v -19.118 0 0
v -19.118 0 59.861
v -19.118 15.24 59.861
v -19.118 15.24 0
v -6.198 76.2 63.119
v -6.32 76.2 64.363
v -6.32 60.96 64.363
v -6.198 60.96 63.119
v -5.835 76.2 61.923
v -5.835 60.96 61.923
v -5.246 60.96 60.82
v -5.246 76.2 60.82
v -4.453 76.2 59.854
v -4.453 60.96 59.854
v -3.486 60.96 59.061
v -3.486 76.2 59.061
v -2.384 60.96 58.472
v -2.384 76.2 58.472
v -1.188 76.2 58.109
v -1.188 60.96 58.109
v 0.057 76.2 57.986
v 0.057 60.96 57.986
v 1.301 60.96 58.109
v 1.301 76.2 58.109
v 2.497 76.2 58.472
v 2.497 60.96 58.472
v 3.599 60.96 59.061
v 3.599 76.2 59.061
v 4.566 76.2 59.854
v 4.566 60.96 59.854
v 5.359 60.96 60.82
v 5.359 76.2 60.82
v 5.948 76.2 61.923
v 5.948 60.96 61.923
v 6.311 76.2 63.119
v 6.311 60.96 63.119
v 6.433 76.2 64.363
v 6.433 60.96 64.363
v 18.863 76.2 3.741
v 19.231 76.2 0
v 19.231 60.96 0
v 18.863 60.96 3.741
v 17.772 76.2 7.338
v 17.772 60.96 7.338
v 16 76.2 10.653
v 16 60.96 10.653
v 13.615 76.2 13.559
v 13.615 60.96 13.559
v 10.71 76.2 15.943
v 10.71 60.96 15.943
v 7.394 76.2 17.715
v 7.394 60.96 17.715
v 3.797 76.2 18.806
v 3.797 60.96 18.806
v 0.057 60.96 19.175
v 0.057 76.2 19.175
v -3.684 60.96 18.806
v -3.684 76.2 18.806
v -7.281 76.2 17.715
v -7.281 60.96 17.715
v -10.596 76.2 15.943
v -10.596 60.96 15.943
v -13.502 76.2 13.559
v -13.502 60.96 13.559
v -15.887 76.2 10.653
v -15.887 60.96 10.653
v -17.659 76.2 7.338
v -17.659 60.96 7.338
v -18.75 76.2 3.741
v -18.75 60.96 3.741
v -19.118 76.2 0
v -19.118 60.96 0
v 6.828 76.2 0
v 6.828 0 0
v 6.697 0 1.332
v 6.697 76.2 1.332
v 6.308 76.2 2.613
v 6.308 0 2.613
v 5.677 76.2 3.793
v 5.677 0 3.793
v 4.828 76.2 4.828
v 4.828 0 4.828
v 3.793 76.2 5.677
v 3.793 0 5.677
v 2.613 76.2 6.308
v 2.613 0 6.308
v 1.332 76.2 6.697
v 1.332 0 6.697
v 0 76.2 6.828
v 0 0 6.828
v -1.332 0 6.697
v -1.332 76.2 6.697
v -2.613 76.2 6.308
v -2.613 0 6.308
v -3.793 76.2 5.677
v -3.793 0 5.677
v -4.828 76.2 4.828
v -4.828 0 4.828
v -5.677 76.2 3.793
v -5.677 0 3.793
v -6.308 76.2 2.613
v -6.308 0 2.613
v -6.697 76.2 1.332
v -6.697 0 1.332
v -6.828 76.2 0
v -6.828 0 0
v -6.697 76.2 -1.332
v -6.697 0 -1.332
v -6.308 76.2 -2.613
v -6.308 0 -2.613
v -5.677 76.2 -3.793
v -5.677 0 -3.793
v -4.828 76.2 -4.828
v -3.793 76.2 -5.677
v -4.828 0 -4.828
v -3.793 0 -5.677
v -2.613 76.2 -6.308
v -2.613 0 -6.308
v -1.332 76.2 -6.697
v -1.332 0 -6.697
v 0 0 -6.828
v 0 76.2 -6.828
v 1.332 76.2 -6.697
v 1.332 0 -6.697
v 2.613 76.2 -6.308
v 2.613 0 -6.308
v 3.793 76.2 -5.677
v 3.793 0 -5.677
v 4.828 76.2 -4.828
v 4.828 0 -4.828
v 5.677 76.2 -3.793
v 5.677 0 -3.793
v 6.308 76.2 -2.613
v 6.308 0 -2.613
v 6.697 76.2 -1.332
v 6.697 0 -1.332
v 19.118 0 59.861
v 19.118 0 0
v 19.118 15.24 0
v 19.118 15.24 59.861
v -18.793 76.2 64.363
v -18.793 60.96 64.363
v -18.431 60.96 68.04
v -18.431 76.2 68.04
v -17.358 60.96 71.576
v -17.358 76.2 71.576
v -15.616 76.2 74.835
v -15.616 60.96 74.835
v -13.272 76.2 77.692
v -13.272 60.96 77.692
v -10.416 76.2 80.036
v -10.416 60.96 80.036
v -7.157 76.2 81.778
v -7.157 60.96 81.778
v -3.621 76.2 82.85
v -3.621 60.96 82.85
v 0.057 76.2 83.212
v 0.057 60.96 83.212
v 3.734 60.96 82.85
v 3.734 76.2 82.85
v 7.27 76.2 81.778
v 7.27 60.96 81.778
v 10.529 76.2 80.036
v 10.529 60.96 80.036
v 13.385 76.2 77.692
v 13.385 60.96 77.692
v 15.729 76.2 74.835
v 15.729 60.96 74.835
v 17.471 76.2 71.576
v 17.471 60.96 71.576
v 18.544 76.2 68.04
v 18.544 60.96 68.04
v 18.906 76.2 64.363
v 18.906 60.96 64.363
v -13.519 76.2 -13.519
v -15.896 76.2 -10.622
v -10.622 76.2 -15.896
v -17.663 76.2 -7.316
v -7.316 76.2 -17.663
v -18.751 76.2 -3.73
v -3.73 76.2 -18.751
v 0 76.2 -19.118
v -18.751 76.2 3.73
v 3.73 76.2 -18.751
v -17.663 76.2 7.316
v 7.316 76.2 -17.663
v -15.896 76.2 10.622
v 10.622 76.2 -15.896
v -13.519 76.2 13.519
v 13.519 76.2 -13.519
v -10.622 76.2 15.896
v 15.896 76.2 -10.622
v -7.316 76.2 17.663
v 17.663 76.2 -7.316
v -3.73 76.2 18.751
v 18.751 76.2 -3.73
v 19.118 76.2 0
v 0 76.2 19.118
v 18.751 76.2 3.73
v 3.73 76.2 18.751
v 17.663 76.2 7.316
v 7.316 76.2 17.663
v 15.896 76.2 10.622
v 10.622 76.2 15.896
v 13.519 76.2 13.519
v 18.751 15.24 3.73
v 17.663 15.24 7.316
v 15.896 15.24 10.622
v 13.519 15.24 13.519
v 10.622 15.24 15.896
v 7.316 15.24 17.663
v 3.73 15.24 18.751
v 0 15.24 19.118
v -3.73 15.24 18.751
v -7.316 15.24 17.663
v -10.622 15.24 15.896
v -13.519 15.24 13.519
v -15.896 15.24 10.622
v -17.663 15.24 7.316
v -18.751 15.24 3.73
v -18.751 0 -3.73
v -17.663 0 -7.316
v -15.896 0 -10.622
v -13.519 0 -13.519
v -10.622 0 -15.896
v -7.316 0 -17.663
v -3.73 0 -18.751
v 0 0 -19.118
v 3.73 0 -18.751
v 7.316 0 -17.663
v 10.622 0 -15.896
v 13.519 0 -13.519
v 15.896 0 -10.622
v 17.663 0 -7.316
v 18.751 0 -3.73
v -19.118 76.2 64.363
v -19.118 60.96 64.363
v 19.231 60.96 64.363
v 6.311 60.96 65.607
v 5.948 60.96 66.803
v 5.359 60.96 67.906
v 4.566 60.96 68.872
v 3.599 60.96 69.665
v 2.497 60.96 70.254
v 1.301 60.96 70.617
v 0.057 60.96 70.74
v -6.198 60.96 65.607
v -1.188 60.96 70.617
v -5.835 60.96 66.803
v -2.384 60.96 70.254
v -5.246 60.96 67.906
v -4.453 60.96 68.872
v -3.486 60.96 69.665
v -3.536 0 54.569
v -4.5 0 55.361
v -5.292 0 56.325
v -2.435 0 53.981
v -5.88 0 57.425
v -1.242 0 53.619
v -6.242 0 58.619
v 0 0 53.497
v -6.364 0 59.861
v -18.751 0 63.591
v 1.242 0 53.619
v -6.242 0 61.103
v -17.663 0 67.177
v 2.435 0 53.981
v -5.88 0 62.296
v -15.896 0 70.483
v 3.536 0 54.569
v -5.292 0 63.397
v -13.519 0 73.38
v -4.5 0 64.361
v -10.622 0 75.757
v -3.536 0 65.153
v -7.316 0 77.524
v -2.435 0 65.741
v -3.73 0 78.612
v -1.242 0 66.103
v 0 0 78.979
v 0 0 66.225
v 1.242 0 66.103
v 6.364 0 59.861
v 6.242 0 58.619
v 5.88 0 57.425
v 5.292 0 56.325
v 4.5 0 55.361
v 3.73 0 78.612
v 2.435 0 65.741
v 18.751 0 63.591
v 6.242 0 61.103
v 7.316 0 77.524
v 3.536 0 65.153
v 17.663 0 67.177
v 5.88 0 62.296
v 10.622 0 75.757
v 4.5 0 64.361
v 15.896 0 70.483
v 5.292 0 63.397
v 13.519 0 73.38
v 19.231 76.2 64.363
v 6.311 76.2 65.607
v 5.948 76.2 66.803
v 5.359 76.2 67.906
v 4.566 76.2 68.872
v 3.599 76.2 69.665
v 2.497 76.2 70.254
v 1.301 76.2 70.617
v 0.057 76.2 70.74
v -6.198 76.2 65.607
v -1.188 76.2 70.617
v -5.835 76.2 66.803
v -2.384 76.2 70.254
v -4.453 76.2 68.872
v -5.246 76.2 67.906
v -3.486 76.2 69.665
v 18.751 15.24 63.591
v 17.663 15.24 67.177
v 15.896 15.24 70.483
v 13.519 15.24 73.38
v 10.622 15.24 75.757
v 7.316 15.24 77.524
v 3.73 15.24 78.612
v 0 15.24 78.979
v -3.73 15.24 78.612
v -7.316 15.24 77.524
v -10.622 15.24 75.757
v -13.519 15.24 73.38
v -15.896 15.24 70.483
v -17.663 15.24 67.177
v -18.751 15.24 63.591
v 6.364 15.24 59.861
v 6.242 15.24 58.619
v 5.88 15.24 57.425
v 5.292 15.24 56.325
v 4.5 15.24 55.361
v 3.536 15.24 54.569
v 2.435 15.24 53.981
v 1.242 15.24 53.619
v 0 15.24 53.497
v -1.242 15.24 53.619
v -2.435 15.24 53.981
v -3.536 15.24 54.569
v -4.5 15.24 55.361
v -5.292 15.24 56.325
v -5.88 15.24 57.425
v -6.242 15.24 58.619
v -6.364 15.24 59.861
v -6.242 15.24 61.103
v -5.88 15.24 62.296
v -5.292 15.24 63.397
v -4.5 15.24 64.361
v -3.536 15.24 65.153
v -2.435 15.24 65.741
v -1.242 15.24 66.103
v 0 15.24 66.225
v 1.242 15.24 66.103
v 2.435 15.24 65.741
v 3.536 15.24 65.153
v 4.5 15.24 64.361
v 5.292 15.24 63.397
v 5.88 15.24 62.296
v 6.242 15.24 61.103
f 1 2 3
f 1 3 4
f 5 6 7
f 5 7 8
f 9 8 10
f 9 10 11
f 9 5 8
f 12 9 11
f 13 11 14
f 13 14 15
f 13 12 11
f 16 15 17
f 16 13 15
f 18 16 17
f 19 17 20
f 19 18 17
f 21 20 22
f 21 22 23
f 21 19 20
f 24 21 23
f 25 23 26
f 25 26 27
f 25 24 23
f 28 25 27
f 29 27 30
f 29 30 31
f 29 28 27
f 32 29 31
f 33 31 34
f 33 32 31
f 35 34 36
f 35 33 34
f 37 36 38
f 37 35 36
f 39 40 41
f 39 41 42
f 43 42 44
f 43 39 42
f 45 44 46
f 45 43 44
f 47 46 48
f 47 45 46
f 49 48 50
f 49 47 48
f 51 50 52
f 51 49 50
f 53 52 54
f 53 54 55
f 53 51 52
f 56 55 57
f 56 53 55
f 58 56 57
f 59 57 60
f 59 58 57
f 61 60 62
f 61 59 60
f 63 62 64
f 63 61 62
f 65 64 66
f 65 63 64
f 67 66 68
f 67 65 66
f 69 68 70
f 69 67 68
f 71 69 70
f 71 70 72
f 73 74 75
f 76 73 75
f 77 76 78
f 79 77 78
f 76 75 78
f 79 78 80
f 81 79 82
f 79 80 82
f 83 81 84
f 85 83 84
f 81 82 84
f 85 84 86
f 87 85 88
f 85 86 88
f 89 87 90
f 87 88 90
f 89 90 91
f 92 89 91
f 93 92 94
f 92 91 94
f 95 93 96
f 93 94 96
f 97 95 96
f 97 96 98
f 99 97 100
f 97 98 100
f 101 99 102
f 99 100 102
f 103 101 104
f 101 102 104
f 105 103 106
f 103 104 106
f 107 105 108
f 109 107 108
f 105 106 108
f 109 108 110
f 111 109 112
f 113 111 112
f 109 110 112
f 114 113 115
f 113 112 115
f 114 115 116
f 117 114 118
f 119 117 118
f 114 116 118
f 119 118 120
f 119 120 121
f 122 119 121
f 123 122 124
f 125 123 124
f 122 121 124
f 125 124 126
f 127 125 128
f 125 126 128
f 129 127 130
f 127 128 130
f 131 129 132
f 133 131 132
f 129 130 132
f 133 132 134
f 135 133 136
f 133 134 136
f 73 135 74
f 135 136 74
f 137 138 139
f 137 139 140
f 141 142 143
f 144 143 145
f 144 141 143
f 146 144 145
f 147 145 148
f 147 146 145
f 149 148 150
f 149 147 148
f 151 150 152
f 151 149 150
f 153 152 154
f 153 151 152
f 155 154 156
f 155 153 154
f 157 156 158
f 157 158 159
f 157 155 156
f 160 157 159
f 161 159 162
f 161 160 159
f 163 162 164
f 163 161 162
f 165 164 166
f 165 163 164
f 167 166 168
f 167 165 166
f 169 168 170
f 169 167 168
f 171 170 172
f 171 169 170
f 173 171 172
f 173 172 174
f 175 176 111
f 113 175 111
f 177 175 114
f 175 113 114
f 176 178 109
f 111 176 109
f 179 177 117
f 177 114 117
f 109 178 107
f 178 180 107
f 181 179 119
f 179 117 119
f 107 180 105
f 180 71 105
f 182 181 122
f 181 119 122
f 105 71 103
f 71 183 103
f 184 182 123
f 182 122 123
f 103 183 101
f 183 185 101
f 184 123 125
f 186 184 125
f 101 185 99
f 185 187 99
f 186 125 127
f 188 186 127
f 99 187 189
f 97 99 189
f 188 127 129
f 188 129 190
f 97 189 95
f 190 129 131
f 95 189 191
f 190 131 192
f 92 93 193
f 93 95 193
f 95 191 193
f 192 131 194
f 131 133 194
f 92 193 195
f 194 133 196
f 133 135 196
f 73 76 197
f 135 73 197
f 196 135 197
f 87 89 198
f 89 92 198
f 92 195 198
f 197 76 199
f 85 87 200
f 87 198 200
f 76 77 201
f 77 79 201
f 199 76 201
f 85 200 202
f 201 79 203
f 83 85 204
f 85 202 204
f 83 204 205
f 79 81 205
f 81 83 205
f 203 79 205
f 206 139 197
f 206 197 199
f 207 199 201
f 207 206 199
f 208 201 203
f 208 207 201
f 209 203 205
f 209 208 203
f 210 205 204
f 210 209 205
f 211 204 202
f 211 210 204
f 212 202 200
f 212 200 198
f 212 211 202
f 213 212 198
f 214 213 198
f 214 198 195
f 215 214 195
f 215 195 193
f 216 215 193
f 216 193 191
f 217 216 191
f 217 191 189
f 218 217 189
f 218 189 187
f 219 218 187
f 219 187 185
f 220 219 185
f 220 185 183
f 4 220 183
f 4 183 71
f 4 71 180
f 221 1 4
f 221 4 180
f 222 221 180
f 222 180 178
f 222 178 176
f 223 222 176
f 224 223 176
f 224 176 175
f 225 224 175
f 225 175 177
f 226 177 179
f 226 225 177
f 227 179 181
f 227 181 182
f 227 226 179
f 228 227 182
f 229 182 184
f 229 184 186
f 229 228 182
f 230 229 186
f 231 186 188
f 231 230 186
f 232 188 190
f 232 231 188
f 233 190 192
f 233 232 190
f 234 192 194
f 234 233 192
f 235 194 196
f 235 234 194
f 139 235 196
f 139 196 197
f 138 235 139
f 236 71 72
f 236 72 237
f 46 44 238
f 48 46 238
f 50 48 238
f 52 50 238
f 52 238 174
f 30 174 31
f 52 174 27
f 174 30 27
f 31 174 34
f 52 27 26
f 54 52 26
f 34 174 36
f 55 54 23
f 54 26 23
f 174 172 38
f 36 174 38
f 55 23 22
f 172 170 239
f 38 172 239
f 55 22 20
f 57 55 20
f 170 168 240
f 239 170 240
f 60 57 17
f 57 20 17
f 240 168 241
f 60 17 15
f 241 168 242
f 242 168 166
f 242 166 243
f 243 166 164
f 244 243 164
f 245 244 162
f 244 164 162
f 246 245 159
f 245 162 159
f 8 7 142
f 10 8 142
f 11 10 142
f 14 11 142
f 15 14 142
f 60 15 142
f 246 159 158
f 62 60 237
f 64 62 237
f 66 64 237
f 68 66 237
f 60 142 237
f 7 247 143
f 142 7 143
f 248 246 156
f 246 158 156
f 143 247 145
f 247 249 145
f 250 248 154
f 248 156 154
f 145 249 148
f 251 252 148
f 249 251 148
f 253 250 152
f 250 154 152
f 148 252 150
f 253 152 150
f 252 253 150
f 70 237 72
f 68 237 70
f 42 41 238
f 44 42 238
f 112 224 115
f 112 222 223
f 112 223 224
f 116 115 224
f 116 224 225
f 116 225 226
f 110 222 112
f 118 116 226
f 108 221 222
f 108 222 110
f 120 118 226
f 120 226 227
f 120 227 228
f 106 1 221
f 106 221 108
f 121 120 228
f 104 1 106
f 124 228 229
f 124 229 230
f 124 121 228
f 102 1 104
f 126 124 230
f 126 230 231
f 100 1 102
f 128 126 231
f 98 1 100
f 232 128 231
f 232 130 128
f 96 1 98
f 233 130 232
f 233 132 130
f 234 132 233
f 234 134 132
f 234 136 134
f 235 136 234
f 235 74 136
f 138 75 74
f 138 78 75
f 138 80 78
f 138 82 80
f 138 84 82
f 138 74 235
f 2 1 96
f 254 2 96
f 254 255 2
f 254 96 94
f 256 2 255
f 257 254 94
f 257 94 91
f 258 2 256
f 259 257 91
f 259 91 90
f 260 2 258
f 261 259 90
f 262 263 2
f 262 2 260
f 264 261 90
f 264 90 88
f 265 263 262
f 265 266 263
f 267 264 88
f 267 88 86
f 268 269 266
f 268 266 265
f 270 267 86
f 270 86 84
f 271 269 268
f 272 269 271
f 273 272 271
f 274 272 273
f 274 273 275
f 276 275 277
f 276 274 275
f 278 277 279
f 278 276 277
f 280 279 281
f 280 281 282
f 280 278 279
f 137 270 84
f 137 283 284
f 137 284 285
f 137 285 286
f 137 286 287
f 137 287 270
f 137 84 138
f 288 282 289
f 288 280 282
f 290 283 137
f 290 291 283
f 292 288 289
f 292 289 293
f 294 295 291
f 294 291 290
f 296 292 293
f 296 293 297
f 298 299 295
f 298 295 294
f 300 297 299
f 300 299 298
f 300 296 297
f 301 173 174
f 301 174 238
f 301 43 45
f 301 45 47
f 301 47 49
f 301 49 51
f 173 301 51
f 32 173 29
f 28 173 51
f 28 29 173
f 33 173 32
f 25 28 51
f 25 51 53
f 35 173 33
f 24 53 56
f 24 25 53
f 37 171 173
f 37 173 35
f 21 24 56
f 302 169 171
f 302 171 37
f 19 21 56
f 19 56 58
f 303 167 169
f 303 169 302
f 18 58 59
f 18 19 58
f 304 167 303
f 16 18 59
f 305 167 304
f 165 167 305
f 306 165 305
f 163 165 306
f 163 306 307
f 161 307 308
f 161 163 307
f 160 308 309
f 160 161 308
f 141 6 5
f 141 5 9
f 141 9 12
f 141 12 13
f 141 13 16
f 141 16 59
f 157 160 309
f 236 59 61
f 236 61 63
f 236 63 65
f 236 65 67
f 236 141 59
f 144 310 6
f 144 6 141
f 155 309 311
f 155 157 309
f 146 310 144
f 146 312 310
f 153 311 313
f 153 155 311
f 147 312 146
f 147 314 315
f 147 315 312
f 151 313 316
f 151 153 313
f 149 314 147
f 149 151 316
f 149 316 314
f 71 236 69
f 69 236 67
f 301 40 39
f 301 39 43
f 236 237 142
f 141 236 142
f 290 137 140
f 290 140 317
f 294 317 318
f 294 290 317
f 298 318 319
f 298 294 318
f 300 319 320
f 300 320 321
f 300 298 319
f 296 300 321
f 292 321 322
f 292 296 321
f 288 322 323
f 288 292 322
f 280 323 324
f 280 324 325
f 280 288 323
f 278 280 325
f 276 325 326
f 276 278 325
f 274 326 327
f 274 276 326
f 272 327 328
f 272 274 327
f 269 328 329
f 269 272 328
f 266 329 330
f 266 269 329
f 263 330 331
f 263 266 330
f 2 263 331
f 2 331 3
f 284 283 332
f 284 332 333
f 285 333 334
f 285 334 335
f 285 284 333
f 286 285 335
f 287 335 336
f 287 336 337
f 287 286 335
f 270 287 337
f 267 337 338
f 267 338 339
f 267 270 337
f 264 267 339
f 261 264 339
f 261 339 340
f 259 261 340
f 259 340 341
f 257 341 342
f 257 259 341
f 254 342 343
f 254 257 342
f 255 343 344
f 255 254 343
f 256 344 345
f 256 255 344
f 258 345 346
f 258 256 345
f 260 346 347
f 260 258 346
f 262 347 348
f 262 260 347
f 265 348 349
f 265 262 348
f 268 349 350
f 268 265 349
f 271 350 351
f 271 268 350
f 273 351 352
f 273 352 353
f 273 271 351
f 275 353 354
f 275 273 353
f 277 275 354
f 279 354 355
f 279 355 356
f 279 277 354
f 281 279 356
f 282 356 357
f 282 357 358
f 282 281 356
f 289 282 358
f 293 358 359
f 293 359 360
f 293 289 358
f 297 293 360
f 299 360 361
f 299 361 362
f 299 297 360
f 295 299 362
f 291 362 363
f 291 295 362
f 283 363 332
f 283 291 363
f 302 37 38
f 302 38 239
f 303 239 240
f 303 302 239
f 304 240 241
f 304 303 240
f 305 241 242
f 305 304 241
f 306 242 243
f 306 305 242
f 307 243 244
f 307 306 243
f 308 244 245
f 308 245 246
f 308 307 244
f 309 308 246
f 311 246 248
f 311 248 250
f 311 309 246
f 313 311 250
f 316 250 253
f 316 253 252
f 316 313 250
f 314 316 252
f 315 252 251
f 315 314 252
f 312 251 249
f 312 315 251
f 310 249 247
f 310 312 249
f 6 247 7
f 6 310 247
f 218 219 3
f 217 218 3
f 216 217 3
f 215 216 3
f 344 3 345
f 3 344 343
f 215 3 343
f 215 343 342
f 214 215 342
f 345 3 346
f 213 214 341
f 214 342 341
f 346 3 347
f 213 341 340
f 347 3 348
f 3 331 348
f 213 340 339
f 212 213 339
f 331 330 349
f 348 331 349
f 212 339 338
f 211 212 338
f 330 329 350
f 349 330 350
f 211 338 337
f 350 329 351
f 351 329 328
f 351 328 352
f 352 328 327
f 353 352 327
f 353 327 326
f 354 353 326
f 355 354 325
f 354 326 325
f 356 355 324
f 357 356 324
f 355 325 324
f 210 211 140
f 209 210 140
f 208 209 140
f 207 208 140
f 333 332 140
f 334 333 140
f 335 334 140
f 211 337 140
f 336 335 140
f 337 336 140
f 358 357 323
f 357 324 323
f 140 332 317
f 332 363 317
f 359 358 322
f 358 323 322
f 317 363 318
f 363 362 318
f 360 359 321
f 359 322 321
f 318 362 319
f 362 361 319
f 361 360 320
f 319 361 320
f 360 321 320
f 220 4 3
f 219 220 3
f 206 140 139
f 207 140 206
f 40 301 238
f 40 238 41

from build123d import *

# Parameters (mm, degrees)
F0_R     = 19.1183329558
F0_R_2   = 6.8278686451
F1_DEPTH = 76.2
F3_DEPTH = 15.24
F5_DEPTH = 15.24


with BuildPart() as f1:
    # F0 (on Front) → F1 (new body)
    with BuildSketch(Plane.XZ):
        Circle(F0_R)
        Circle(F0_R_2, mode=Mode.SUBTRACT)
    extrude(amount=-F1_DEPTH)

    # F2 (on Front) → F3 (join)
    with BuildSketch(Plane.XZ):
        with BuildLine():
            ThreePointArc((-6.364259504, 59.8609298468), (0, 66.2251893508), (6.364259504, 59.8609298468))
            Line((6.364259504, 59.8609298468), (19.1183329558, 59.8609298468))
            ThreePointArc((19.1183329558, 59.8609298468), (0, 78.9792628025), (-19.1183329558, 59.8609298468))
            Line((-19.1183329558, 59.8609298468), (-6.364259504, 59.8609298468))
        make_face()
        with BuildLine():
            Line((19.1183329558, 59.8609298468), (6.364259504, 59.8609298468))
            ThreePointArc((6.364259504, 59.8609298468), (0, 53.4966703428), (-6.364259504, 59.8609298468))
            Line((-6.364259504, 59.8609298468), (-19.1183329558, 59.8609298468))
            ThreePointArc((-19.1183329558, 59.8609298468), (0, 40.742596891), (19.1183329558, 59.8609298468))
        make_face()
        with BuildLine():
            Line((19.1183329558, 0), (19.1183329558, 59.8609298468))
            ThreePointArc((19.1183329558, 59.8609298468), (0, 40.742596891), (-19.1183329558, 59.8609298468))
            Line((-19.1183329558, 59.8609298468), (-19.1183329558, 0))
            ThreePointArc((-19.1183329558, 0), (0, 19.1183329558), (19.1183329558, 0))
        make_face()
    extrude(amount=-F3_DEPTH)


with BuildPart() as f5:
    # F4 (on face) → F5 (new body)
    with BuildSketch(Plane(origin=(0, 76.2, 0), x_dir=(-1, 0, 0), z_dir=(0, 1, 0))):
        with BuildLine():
            Line((19.1183329558, 0), (19.1183329558, 64.3630325794))
            Line((19.1183329558, 64.3630325794), (18.7928472869, 64.3630325794))
            ThreePointArc((18.7928472869, 64.3630325794), (-0.0565509779, 45.5136343147), (-18.9059492426, 64.3630325794))
            Line((-18.9059492426, 64.3630325794), (-19.2314349115, 64.3630325794))
            Line((-19.2314349115, 64.3630325794), (-19.2314349115, 0))
            ThreePointArc((-19.2314349115, 0), (-0.0565509779, 19.1748839336), (19.1183329558, 0))
        make_face()
        with BuildLine():
            ThreePointArc((-18.9059492426, 64.3630325794), (-0.0565509779, 45.5136343147), (18.7928472869, 64.3630325794))
            Line((18.7928472869, 64.3630325794), (6.3202523649, 64.3630325794))
            ThreePointArc((6.3202523649, 64.3630325794), (-0.0565509779, 57.9862292367), (-6.4333543206, 64.3630325794))
            Line((-6.4333543206, 64.3630325794), (-18.9059492426, 64.3630325794))
        make_face()
        with BuildLine():
            Line((6.3202523649, 64.3630325794), (18.7928472869, 64.3630325794))
            ThreePointArc((18.7928472869, 64.3630325794), (-0.0565509779, 83.2124308442), (-18.9059492426, 64.3630325794))
            Line((-18.9059492426, 64.3630325794), (-6.4333543206, 64.3630325794))
            ThreePointArc((-6.4333543206, 64.3630325794), (-0.0565509779, 70.7398359221), (6.3202523649, 64.3630325794))
        make_face()
    extrude(amount=-F5_DEPTH)


solid = Compound([f1.part, f5.part])
